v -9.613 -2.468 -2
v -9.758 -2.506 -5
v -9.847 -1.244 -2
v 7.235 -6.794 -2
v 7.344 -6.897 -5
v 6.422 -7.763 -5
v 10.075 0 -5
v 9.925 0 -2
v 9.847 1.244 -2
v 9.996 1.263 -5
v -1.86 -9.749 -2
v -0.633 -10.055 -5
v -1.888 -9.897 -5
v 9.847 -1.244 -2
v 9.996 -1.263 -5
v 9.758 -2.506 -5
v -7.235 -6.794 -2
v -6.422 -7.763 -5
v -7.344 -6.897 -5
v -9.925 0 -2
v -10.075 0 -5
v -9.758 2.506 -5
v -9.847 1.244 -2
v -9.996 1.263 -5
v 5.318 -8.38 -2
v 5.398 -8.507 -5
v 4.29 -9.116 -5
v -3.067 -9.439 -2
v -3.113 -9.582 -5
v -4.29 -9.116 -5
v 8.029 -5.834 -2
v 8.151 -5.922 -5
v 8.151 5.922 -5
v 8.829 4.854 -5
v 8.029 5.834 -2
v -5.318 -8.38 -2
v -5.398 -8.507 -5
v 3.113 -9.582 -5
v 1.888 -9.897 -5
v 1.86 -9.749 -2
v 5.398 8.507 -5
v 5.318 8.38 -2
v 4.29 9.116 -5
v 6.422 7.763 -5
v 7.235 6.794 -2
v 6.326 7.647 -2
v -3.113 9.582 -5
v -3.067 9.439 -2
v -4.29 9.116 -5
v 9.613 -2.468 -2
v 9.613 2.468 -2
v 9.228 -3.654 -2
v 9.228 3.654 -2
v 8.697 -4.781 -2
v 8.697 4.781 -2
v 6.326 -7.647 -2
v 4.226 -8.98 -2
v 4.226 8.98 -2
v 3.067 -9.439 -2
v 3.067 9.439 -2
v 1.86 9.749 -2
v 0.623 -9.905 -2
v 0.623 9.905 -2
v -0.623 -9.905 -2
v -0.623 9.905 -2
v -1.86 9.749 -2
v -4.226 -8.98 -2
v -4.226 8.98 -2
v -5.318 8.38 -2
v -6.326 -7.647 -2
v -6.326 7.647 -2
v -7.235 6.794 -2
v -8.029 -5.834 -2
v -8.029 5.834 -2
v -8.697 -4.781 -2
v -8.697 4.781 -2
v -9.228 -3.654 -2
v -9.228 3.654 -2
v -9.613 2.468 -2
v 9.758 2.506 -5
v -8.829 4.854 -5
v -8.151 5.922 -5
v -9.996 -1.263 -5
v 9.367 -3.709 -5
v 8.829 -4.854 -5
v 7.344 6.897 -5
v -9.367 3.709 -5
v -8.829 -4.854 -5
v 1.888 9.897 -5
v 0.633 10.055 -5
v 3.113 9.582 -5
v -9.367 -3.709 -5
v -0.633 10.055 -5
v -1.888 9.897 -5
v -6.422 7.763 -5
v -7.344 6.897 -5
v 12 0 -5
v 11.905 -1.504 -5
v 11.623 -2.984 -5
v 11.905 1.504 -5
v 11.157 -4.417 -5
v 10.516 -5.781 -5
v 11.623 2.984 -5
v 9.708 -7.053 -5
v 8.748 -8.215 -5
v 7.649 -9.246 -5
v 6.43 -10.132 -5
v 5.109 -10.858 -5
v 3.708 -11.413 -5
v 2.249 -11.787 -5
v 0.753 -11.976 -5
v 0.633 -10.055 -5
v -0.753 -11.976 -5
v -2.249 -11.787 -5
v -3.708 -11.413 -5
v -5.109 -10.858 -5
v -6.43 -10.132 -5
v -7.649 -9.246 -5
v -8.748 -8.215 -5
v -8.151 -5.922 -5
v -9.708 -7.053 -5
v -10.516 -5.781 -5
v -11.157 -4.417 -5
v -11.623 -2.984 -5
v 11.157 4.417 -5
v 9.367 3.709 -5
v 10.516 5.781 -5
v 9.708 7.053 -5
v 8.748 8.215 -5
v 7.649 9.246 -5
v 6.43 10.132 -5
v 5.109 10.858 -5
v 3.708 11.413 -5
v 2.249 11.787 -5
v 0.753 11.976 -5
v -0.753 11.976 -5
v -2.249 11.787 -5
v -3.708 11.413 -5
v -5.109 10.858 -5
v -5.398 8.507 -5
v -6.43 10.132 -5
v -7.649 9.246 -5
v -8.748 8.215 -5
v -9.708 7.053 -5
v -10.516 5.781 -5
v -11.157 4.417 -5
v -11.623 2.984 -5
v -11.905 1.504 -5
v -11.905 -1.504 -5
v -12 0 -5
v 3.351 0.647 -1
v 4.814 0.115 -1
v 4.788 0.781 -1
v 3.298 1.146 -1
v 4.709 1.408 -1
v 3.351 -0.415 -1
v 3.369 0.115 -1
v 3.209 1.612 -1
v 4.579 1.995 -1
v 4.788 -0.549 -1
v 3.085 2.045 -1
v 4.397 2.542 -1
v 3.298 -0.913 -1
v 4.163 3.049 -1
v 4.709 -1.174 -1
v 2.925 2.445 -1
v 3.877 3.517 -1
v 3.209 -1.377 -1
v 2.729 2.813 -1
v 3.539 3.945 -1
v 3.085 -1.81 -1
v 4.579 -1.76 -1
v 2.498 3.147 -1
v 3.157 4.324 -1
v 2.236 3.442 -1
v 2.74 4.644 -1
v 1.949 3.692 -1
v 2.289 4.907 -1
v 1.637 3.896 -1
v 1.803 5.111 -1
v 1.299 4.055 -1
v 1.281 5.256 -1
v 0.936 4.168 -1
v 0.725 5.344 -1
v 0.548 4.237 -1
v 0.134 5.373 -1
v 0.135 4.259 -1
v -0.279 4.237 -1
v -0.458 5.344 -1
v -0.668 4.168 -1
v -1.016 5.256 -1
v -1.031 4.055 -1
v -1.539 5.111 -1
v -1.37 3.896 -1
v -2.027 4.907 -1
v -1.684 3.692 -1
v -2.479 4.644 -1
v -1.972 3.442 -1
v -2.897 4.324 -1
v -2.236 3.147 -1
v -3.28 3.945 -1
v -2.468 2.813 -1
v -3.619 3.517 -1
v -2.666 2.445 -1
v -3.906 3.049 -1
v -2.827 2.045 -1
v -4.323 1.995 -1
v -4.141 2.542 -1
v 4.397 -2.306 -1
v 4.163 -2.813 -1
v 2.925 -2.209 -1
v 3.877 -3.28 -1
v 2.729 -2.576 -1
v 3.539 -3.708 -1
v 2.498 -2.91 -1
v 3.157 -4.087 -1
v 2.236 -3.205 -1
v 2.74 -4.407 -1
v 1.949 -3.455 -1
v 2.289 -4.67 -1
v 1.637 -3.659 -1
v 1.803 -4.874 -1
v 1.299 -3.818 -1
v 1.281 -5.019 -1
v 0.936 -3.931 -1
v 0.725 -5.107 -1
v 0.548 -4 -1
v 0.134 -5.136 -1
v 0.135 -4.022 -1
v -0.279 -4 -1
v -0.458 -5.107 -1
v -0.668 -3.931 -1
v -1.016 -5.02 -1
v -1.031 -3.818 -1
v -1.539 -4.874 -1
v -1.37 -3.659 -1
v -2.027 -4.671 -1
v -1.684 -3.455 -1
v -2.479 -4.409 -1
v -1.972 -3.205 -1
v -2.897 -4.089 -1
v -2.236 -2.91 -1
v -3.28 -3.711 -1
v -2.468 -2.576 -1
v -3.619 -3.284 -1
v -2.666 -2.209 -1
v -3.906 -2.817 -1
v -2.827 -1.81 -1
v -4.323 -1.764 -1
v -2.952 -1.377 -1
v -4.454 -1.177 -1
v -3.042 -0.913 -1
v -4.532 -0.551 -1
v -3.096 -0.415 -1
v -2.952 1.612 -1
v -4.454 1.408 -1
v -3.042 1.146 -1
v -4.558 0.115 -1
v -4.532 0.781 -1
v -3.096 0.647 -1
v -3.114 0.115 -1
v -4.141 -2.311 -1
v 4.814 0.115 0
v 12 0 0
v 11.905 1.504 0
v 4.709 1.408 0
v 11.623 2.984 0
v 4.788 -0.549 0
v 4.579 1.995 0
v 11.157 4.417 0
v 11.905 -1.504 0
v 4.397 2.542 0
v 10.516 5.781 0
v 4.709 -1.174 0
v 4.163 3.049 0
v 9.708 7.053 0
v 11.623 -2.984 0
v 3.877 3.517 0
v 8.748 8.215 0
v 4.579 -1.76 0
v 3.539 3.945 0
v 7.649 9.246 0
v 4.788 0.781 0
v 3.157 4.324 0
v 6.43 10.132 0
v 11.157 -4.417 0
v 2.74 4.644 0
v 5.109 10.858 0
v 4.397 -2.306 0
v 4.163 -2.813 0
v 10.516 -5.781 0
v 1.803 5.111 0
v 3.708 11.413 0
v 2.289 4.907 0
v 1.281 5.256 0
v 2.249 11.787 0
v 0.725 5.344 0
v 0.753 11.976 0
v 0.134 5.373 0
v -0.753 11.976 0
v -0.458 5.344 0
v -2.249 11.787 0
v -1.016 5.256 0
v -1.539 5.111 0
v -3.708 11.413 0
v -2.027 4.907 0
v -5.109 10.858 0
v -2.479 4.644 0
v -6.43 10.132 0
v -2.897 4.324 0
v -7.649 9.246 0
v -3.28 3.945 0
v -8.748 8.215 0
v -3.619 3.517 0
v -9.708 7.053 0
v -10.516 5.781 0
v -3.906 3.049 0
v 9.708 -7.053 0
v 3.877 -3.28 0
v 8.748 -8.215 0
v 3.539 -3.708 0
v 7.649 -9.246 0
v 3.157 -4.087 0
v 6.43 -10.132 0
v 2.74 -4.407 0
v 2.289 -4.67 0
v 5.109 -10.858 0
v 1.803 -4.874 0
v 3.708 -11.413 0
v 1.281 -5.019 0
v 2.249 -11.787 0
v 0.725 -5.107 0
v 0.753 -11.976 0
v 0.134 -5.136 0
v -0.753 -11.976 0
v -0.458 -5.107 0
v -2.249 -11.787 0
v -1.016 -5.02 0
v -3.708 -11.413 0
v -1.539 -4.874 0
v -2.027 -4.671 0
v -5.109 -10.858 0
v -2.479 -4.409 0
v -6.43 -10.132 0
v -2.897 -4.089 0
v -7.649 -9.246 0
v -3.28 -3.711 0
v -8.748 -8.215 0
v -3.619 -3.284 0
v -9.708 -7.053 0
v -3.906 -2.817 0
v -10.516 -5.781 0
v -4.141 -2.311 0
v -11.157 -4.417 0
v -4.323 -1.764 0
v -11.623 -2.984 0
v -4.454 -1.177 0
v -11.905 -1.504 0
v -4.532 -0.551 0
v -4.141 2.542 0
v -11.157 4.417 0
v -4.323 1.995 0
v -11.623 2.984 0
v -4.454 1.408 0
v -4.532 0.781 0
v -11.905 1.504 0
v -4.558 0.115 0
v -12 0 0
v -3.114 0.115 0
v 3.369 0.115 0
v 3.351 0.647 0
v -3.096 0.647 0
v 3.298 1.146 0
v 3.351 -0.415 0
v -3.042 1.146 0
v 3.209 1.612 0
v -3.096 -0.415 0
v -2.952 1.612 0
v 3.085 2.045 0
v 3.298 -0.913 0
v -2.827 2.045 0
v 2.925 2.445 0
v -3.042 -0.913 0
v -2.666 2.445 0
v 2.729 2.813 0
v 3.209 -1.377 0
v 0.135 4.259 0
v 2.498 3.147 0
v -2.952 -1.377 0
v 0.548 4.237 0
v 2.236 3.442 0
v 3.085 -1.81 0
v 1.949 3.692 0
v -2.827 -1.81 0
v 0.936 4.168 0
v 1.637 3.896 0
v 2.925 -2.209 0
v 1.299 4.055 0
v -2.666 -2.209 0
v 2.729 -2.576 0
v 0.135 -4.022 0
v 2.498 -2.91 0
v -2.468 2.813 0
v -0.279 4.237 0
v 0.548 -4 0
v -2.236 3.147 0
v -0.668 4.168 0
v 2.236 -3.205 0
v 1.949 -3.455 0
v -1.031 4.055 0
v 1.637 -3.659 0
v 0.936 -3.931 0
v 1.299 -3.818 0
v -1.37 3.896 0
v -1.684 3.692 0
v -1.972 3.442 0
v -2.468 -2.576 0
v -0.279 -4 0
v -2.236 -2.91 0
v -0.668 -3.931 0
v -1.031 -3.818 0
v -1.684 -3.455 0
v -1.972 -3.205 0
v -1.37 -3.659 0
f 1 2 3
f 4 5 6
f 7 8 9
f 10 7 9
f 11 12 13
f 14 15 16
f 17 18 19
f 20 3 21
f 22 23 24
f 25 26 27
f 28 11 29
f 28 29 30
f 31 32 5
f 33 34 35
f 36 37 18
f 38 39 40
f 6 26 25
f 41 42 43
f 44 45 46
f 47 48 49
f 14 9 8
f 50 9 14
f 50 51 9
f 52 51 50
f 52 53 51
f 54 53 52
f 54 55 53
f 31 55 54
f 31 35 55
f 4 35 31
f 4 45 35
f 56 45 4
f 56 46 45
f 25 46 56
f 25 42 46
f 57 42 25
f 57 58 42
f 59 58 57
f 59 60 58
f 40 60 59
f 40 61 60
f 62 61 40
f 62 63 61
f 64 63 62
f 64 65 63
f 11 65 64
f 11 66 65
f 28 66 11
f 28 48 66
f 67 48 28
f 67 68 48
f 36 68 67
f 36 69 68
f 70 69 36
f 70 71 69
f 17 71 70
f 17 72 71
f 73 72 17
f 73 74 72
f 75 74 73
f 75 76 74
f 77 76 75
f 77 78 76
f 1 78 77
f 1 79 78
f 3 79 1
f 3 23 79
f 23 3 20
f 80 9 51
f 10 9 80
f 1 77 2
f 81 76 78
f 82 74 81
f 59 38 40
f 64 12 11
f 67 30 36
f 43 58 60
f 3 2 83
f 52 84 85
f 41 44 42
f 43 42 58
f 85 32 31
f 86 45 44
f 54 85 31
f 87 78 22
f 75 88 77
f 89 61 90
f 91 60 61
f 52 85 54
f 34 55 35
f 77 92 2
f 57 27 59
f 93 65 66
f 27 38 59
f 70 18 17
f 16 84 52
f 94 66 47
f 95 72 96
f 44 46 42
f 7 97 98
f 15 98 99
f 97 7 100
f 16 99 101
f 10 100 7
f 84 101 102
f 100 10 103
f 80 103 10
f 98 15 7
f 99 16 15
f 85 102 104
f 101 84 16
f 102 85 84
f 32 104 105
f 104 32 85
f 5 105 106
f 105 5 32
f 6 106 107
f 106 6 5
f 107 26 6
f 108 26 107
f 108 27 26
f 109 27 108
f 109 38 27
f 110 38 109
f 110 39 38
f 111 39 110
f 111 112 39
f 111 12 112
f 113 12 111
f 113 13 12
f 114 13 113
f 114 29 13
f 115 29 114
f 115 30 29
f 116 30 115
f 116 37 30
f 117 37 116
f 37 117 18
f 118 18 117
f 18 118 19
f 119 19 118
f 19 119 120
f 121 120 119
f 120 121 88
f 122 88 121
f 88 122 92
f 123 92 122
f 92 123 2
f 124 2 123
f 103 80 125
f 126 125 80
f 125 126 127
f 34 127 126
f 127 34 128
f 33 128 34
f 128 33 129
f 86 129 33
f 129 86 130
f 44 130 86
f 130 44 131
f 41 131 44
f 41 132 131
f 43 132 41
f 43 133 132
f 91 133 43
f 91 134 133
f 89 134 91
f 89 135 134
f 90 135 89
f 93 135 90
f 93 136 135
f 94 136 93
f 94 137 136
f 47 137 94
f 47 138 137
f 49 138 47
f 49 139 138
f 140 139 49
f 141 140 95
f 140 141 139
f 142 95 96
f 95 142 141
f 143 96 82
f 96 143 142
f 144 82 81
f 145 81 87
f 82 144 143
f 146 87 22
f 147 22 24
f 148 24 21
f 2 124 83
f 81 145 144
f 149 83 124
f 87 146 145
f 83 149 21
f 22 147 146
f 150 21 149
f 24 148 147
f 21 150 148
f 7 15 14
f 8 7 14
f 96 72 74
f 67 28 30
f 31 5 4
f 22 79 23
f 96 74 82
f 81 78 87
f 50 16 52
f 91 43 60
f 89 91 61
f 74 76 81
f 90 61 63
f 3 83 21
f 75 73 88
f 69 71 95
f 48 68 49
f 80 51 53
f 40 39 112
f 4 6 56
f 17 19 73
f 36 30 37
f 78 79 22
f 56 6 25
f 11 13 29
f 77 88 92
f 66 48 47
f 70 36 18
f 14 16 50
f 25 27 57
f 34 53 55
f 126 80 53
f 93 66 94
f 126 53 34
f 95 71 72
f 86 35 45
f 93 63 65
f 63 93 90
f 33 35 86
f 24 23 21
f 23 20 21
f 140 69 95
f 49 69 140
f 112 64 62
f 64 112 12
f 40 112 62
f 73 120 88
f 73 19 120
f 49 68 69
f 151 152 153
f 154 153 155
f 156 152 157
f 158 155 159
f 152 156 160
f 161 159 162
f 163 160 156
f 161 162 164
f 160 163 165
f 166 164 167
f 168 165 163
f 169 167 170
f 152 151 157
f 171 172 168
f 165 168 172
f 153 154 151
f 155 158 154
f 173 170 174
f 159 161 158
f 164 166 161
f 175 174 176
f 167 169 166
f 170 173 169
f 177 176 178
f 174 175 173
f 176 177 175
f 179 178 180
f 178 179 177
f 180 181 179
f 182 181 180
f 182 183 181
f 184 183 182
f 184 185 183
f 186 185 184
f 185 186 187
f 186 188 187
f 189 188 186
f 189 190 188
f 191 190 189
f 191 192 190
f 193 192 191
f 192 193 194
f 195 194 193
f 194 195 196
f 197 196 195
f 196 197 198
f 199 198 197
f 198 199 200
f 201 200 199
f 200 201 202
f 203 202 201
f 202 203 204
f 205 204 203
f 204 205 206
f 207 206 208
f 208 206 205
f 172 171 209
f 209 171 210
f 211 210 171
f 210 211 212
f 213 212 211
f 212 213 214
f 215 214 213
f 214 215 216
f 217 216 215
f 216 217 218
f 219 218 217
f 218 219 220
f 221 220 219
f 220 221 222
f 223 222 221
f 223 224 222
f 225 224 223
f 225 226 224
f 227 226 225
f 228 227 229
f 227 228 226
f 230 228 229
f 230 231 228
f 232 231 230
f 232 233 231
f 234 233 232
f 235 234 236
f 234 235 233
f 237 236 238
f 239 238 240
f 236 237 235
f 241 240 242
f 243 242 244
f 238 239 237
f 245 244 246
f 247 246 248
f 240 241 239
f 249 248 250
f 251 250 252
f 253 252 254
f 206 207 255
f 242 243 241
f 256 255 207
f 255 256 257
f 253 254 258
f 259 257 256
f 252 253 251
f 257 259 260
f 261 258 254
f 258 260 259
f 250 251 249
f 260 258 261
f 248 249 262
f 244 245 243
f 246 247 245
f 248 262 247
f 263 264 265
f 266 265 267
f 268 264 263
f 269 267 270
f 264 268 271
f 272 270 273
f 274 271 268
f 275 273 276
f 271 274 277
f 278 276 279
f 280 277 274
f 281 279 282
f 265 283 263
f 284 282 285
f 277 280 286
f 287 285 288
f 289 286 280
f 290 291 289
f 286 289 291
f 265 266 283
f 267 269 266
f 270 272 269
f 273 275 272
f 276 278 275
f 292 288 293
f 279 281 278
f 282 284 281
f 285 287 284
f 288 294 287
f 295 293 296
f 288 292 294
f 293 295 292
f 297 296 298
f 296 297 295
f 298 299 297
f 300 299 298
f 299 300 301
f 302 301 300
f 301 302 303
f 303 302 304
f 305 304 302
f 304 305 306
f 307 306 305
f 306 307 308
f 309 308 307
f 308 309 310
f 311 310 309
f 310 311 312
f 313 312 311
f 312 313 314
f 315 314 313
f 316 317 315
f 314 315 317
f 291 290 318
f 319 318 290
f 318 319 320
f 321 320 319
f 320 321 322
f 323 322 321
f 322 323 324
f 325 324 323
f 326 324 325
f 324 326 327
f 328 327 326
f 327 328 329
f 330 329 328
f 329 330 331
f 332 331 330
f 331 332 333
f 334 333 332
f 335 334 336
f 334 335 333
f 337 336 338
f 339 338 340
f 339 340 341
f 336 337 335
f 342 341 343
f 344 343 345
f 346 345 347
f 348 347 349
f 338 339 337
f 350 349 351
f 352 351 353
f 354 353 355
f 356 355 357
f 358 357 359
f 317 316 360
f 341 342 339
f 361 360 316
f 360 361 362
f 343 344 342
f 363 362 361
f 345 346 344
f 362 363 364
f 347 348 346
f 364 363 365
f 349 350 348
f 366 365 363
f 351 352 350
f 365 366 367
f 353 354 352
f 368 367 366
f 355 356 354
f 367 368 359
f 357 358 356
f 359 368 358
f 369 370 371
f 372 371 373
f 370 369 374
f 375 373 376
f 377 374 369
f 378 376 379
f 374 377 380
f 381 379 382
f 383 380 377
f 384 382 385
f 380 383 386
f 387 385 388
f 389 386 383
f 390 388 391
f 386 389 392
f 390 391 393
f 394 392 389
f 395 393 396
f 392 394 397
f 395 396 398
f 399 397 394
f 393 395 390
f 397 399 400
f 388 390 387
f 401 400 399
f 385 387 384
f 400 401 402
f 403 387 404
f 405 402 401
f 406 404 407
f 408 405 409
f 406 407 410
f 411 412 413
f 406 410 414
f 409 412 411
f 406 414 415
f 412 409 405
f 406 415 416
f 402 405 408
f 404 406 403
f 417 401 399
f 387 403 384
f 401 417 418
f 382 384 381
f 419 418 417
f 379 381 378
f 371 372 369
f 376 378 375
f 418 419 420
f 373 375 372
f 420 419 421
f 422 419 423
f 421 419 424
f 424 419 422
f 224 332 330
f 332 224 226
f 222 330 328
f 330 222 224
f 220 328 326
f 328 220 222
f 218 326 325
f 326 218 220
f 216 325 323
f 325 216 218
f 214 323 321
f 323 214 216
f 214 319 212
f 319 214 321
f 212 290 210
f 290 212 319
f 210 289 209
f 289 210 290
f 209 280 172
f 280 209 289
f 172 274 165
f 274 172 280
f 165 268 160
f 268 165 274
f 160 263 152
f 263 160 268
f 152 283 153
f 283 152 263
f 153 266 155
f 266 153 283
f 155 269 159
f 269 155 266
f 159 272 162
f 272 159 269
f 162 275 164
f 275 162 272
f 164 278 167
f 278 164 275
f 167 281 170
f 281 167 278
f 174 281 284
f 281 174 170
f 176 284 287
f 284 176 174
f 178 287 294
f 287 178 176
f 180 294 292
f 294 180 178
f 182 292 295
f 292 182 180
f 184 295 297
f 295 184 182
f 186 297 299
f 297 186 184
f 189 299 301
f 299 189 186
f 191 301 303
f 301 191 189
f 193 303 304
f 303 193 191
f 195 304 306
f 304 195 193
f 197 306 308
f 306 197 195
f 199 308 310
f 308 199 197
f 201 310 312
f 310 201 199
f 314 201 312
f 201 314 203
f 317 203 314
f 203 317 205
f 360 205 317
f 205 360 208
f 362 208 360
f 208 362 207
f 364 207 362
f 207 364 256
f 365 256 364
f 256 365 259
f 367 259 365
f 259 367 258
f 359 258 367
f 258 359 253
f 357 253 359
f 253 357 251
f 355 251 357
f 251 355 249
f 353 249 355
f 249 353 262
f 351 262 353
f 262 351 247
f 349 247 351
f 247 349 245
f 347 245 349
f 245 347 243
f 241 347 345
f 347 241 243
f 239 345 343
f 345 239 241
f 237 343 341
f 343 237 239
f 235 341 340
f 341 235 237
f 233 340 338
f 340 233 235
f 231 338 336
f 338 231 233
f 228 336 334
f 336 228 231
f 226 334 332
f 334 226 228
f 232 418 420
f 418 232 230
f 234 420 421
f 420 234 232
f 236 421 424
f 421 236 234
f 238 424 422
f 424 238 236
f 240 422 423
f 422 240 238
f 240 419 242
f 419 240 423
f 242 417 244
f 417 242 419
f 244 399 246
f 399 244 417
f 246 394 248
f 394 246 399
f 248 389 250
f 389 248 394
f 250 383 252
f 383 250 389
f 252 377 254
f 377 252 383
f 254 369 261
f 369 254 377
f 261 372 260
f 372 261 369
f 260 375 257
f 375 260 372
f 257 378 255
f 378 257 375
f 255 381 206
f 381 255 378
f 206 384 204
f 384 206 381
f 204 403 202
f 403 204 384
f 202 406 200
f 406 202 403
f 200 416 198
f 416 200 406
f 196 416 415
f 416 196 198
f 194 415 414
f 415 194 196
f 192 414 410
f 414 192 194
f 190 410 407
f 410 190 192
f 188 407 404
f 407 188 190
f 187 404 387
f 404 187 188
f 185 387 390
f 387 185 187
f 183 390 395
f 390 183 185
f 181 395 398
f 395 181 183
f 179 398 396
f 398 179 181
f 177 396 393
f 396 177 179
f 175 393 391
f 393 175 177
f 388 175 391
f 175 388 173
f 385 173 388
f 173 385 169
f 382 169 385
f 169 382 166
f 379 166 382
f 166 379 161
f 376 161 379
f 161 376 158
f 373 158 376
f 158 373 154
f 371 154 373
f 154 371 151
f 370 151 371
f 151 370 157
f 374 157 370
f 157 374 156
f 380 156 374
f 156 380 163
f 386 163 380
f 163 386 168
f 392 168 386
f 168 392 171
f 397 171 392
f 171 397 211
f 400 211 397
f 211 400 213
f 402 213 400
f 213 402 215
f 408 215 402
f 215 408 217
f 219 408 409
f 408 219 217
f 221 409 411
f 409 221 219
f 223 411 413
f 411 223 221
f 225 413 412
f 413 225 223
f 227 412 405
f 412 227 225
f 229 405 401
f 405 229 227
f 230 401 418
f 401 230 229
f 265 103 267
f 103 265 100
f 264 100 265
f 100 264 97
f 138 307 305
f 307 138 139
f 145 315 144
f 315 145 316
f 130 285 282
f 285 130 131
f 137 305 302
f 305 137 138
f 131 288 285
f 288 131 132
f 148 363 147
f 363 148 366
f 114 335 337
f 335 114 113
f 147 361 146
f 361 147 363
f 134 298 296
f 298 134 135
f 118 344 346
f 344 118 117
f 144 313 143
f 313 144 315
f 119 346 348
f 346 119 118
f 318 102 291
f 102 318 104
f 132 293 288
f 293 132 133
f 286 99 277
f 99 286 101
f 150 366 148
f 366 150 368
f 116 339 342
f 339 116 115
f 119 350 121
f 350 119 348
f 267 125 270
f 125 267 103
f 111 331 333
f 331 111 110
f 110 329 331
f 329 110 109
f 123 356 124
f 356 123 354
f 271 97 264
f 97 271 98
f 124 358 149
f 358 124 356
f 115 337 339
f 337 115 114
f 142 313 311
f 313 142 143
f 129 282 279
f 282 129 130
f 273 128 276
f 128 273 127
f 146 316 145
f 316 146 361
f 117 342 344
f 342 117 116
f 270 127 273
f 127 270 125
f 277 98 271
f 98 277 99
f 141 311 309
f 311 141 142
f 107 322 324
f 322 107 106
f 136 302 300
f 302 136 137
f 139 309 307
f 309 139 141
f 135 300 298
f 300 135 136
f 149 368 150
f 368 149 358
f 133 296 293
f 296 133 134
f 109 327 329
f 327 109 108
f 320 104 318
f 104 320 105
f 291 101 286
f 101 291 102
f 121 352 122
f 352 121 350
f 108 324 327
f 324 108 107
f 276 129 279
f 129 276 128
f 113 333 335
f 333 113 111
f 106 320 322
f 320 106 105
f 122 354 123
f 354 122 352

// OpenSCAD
$fn = 50;


difference() {
	union() {
		translate(v = [0, 0, -5.0000000000]) {
			cylinder(h = 5, r = 12.0000000000);
		}
	}
	union() {
		#translate(v = [0, 0, -5.0000000000]) {
			cylinder(h = 3, r1 = 10.0750000000, r2 = 9.9250000000);
		}
		translate(v = [0, 0, -1]) {
			linear_extrude(height = 1) {
				text(font = "Impact", halign = "center", size = 10, text = "O", valign = "center");
			}
		}
	}
}
